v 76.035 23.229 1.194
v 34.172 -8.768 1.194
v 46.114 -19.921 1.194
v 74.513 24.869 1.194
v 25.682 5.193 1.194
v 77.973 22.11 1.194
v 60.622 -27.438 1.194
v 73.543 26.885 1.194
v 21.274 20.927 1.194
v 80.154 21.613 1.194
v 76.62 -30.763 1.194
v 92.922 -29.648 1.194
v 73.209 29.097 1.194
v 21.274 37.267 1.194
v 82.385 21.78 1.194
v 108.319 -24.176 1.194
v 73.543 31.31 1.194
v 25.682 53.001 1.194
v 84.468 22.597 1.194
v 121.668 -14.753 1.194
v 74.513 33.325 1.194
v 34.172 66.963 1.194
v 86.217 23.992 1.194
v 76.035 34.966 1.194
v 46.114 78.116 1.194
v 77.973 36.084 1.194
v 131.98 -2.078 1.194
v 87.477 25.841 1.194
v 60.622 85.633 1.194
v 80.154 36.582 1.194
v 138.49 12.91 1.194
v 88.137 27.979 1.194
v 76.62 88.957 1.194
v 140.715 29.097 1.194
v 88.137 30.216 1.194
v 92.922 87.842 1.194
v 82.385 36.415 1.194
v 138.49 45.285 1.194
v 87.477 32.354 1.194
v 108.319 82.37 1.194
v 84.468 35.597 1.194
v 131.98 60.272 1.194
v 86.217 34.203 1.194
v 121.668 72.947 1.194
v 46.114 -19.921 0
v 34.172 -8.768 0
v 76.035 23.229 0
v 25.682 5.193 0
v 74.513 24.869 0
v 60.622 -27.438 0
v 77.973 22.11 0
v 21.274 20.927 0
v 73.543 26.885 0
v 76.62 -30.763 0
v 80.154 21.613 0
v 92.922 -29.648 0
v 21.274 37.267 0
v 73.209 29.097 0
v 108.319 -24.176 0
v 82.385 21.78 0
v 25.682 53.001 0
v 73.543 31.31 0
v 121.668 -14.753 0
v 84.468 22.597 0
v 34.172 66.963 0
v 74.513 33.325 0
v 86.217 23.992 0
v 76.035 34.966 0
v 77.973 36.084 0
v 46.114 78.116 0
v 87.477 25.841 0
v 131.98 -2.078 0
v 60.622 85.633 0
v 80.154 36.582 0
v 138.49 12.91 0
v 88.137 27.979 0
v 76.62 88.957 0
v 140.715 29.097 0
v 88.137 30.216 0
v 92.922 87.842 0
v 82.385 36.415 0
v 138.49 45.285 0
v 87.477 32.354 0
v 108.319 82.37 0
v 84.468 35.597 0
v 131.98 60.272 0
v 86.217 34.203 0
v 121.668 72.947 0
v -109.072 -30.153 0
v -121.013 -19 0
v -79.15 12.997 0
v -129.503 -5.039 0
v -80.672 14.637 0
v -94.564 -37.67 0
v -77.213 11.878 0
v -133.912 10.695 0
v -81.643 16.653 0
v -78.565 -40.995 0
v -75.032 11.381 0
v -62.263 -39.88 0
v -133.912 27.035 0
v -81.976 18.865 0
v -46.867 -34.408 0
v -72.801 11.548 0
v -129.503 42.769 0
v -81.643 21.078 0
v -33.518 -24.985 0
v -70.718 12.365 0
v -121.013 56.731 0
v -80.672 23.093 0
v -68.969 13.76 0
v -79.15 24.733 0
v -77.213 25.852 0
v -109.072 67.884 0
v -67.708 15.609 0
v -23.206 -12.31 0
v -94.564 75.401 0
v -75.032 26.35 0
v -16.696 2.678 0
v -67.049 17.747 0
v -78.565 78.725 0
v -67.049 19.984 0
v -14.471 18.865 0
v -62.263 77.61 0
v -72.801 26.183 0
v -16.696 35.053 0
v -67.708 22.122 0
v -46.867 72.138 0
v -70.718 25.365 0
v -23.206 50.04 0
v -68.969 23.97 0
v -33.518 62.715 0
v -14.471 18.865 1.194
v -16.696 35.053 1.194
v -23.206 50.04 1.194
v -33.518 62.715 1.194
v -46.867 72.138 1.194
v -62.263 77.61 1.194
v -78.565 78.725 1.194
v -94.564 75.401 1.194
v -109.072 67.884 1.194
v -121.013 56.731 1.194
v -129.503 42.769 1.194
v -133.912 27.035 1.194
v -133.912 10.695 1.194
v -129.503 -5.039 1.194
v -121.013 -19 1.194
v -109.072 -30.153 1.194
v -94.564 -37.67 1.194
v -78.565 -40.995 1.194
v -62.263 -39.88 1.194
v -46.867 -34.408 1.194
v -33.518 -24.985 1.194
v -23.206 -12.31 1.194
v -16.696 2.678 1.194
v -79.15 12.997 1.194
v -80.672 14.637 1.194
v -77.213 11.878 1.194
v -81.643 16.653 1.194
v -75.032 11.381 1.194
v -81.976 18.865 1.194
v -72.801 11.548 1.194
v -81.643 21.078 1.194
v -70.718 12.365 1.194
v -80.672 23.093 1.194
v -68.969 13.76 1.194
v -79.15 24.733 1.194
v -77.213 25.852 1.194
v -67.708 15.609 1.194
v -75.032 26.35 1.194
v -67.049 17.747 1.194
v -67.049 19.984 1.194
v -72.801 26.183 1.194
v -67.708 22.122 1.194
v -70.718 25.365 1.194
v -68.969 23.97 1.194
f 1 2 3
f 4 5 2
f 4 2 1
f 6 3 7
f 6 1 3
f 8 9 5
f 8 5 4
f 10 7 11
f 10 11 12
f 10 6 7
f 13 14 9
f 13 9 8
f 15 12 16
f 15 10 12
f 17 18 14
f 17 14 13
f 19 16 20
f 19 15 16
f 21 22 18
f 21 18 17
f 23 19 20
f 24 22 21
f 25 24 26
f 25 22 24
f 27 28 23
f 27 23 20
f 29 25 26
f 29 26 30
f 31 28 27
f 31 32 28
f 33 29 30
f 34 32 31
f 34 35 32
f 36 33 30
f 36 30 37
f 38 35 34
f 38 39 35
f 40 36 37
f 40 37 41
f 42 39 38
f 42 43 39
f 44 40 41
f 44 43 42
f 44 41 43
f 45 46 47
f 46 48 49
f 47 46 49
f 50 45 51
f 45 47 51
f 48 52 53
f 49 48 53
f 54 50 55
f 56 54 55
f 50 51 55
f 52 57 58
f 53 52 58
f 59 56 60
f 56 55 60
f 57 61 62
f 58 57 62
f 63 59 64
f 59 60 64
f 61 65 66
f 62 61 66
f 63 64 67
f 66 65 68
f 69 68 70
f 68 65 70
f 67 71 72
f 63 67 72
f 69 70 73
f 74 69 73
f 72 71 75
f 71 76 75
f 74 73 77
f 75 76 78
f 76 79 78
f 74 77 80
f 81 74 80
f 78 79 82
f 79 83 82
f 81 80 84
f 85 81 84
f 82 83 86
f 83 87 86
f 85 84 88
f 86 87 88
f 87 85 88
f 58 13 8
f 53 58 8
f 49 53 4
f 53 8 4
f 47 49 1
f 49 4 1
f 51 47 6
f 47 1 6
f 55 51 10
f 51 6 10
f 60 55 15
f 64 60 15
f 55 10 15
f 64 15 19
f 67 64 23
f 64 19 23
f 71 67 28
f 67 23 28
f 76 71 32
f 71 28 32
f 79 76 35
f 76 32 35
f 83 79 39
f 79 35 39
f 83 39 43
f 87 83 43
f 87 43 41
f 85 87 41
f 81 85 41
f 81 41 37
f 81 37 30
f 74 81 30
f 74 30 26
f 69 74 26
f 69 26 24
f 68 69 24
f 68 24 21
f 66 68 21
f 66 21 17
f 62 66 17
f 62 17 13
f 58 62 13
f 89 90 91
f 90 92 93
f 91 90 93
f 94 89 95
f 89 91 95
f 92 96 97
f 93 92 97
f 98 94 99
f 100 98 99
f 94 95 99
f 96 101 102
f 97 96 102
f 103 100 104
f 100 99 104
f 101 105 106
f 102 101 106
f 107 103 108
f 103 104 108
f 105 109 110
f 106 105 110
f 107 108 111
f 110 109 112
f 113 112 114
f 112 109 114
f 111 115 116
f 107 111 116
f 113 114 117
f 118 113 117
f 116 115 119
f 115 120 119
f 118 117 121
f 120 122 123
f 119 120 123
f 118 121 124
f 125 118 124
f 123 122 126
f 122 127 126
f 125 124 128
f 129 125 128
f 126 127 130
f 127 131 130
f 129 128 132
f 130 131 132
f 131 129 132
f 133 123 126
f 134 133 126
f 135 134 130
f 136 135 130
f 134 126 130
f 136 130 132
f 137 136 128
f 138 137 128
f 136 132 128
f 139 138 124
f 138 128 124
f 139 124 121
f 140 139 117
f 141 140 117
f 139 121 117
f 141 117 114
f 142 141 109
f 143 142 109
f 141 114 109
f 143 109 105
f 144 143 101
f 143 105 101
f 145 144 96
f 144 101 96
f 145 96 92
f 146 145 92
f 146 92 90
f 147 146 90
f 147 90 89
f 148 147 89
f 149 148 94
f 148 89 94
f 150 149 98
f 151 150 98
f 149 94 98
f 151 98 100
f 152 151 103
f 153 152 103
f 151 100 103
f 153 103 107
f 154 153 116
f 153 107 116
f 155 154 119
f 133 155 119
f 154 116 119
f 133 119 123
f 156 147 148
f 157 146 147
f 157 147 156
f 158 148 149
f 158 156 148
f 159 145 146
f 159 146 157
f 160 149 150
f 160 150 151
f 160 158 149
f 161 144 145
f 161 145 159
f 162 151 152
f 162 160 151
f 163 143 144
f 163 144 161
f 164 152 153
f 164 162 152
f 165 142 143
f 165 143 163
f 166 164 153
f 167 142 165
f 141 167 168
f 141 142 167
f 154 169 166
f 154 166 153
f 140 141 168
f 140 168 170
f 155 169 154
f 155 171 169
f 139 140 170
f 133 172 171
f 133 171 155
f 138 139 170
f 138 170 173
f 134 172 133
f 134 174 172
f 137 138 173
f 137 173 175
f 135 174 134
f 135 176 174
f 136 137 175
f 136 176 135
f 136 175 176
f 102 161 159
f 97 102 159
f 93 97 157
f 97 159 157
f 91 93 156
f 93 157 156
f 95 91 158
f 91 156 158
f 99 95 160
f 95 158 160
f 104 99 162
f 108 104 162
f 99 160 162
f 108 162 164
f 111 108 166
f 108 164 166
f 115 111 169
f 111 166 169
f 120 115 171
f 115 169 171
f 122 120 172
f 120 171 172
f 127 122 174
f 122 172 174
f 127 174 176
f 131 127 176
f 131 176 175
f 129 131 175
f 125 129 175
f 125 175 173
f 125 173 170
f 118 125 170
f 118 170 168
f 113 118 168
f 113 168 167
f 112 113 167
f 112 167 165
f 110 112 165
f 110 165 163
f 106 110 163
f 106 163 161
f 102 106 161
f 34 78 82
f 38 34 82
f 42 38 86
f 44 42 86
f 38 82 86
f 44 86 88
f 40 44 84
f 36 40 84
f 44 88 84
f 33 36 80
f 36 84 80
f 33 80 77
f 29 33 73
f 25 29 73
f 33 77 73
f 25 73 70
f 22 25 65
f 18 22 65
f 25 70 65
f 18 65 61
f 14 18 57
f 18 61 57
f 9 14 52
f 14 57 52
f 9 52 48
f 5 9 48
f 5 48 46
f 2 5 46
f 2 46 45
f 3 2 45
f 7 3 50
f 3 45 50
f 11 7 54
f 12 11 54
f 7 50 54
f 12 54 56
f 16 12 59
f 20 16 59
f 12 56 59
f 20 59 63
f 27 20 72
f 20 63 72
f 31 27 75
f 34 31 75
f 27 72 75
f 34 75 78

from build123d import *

# Parameters (mm, degrees)
F0_R     = 60
F1_DEPTH = 1.1938
F2_D     = 15.0114
F2_2_D   = 15.0114


with BuildPart() as f1:
    # F0 (on Top) → F1 (new body)
    with BuildSketch(Plane.XY):
        with Locations((-74.4707694169, 18.8653067038)):
            Circle(F0_R)
    extrude(amount=F1_DEPTH)

    # F2 (through all)
    with Locations(Plane(origin=(0, 0, 0), x_dir=(1, 0, 0), z_dir=(0, 0, -1))):
        with Locations((-74.4707694169, -18.8653067038), (80.7149765843, -29.097335006)):
            Hole(F2_D / 2)


with BuildPart() as f1b:
    # F0 (on Top) → F1, piece 2 (new body)
    with BuildSketch(Plane.XY):
        with Locations((80.7149765843, 29.097335006)):
            Circle(F0_R)
    extrude(amount=F1_DEPTH)

    # F2#2 (through all)
    with Locations(Plane(origin=(0, 0, 0), x_dir=(1, 0, 0), z_dir=(0, 0, -1))):
        with Locations((-74.4707694169, -18.8653067038), (80.7149765843, -29.097335006)):
            Hole(F2_2_D / 2)


solid = Compound([f1.part, f1b.part])
